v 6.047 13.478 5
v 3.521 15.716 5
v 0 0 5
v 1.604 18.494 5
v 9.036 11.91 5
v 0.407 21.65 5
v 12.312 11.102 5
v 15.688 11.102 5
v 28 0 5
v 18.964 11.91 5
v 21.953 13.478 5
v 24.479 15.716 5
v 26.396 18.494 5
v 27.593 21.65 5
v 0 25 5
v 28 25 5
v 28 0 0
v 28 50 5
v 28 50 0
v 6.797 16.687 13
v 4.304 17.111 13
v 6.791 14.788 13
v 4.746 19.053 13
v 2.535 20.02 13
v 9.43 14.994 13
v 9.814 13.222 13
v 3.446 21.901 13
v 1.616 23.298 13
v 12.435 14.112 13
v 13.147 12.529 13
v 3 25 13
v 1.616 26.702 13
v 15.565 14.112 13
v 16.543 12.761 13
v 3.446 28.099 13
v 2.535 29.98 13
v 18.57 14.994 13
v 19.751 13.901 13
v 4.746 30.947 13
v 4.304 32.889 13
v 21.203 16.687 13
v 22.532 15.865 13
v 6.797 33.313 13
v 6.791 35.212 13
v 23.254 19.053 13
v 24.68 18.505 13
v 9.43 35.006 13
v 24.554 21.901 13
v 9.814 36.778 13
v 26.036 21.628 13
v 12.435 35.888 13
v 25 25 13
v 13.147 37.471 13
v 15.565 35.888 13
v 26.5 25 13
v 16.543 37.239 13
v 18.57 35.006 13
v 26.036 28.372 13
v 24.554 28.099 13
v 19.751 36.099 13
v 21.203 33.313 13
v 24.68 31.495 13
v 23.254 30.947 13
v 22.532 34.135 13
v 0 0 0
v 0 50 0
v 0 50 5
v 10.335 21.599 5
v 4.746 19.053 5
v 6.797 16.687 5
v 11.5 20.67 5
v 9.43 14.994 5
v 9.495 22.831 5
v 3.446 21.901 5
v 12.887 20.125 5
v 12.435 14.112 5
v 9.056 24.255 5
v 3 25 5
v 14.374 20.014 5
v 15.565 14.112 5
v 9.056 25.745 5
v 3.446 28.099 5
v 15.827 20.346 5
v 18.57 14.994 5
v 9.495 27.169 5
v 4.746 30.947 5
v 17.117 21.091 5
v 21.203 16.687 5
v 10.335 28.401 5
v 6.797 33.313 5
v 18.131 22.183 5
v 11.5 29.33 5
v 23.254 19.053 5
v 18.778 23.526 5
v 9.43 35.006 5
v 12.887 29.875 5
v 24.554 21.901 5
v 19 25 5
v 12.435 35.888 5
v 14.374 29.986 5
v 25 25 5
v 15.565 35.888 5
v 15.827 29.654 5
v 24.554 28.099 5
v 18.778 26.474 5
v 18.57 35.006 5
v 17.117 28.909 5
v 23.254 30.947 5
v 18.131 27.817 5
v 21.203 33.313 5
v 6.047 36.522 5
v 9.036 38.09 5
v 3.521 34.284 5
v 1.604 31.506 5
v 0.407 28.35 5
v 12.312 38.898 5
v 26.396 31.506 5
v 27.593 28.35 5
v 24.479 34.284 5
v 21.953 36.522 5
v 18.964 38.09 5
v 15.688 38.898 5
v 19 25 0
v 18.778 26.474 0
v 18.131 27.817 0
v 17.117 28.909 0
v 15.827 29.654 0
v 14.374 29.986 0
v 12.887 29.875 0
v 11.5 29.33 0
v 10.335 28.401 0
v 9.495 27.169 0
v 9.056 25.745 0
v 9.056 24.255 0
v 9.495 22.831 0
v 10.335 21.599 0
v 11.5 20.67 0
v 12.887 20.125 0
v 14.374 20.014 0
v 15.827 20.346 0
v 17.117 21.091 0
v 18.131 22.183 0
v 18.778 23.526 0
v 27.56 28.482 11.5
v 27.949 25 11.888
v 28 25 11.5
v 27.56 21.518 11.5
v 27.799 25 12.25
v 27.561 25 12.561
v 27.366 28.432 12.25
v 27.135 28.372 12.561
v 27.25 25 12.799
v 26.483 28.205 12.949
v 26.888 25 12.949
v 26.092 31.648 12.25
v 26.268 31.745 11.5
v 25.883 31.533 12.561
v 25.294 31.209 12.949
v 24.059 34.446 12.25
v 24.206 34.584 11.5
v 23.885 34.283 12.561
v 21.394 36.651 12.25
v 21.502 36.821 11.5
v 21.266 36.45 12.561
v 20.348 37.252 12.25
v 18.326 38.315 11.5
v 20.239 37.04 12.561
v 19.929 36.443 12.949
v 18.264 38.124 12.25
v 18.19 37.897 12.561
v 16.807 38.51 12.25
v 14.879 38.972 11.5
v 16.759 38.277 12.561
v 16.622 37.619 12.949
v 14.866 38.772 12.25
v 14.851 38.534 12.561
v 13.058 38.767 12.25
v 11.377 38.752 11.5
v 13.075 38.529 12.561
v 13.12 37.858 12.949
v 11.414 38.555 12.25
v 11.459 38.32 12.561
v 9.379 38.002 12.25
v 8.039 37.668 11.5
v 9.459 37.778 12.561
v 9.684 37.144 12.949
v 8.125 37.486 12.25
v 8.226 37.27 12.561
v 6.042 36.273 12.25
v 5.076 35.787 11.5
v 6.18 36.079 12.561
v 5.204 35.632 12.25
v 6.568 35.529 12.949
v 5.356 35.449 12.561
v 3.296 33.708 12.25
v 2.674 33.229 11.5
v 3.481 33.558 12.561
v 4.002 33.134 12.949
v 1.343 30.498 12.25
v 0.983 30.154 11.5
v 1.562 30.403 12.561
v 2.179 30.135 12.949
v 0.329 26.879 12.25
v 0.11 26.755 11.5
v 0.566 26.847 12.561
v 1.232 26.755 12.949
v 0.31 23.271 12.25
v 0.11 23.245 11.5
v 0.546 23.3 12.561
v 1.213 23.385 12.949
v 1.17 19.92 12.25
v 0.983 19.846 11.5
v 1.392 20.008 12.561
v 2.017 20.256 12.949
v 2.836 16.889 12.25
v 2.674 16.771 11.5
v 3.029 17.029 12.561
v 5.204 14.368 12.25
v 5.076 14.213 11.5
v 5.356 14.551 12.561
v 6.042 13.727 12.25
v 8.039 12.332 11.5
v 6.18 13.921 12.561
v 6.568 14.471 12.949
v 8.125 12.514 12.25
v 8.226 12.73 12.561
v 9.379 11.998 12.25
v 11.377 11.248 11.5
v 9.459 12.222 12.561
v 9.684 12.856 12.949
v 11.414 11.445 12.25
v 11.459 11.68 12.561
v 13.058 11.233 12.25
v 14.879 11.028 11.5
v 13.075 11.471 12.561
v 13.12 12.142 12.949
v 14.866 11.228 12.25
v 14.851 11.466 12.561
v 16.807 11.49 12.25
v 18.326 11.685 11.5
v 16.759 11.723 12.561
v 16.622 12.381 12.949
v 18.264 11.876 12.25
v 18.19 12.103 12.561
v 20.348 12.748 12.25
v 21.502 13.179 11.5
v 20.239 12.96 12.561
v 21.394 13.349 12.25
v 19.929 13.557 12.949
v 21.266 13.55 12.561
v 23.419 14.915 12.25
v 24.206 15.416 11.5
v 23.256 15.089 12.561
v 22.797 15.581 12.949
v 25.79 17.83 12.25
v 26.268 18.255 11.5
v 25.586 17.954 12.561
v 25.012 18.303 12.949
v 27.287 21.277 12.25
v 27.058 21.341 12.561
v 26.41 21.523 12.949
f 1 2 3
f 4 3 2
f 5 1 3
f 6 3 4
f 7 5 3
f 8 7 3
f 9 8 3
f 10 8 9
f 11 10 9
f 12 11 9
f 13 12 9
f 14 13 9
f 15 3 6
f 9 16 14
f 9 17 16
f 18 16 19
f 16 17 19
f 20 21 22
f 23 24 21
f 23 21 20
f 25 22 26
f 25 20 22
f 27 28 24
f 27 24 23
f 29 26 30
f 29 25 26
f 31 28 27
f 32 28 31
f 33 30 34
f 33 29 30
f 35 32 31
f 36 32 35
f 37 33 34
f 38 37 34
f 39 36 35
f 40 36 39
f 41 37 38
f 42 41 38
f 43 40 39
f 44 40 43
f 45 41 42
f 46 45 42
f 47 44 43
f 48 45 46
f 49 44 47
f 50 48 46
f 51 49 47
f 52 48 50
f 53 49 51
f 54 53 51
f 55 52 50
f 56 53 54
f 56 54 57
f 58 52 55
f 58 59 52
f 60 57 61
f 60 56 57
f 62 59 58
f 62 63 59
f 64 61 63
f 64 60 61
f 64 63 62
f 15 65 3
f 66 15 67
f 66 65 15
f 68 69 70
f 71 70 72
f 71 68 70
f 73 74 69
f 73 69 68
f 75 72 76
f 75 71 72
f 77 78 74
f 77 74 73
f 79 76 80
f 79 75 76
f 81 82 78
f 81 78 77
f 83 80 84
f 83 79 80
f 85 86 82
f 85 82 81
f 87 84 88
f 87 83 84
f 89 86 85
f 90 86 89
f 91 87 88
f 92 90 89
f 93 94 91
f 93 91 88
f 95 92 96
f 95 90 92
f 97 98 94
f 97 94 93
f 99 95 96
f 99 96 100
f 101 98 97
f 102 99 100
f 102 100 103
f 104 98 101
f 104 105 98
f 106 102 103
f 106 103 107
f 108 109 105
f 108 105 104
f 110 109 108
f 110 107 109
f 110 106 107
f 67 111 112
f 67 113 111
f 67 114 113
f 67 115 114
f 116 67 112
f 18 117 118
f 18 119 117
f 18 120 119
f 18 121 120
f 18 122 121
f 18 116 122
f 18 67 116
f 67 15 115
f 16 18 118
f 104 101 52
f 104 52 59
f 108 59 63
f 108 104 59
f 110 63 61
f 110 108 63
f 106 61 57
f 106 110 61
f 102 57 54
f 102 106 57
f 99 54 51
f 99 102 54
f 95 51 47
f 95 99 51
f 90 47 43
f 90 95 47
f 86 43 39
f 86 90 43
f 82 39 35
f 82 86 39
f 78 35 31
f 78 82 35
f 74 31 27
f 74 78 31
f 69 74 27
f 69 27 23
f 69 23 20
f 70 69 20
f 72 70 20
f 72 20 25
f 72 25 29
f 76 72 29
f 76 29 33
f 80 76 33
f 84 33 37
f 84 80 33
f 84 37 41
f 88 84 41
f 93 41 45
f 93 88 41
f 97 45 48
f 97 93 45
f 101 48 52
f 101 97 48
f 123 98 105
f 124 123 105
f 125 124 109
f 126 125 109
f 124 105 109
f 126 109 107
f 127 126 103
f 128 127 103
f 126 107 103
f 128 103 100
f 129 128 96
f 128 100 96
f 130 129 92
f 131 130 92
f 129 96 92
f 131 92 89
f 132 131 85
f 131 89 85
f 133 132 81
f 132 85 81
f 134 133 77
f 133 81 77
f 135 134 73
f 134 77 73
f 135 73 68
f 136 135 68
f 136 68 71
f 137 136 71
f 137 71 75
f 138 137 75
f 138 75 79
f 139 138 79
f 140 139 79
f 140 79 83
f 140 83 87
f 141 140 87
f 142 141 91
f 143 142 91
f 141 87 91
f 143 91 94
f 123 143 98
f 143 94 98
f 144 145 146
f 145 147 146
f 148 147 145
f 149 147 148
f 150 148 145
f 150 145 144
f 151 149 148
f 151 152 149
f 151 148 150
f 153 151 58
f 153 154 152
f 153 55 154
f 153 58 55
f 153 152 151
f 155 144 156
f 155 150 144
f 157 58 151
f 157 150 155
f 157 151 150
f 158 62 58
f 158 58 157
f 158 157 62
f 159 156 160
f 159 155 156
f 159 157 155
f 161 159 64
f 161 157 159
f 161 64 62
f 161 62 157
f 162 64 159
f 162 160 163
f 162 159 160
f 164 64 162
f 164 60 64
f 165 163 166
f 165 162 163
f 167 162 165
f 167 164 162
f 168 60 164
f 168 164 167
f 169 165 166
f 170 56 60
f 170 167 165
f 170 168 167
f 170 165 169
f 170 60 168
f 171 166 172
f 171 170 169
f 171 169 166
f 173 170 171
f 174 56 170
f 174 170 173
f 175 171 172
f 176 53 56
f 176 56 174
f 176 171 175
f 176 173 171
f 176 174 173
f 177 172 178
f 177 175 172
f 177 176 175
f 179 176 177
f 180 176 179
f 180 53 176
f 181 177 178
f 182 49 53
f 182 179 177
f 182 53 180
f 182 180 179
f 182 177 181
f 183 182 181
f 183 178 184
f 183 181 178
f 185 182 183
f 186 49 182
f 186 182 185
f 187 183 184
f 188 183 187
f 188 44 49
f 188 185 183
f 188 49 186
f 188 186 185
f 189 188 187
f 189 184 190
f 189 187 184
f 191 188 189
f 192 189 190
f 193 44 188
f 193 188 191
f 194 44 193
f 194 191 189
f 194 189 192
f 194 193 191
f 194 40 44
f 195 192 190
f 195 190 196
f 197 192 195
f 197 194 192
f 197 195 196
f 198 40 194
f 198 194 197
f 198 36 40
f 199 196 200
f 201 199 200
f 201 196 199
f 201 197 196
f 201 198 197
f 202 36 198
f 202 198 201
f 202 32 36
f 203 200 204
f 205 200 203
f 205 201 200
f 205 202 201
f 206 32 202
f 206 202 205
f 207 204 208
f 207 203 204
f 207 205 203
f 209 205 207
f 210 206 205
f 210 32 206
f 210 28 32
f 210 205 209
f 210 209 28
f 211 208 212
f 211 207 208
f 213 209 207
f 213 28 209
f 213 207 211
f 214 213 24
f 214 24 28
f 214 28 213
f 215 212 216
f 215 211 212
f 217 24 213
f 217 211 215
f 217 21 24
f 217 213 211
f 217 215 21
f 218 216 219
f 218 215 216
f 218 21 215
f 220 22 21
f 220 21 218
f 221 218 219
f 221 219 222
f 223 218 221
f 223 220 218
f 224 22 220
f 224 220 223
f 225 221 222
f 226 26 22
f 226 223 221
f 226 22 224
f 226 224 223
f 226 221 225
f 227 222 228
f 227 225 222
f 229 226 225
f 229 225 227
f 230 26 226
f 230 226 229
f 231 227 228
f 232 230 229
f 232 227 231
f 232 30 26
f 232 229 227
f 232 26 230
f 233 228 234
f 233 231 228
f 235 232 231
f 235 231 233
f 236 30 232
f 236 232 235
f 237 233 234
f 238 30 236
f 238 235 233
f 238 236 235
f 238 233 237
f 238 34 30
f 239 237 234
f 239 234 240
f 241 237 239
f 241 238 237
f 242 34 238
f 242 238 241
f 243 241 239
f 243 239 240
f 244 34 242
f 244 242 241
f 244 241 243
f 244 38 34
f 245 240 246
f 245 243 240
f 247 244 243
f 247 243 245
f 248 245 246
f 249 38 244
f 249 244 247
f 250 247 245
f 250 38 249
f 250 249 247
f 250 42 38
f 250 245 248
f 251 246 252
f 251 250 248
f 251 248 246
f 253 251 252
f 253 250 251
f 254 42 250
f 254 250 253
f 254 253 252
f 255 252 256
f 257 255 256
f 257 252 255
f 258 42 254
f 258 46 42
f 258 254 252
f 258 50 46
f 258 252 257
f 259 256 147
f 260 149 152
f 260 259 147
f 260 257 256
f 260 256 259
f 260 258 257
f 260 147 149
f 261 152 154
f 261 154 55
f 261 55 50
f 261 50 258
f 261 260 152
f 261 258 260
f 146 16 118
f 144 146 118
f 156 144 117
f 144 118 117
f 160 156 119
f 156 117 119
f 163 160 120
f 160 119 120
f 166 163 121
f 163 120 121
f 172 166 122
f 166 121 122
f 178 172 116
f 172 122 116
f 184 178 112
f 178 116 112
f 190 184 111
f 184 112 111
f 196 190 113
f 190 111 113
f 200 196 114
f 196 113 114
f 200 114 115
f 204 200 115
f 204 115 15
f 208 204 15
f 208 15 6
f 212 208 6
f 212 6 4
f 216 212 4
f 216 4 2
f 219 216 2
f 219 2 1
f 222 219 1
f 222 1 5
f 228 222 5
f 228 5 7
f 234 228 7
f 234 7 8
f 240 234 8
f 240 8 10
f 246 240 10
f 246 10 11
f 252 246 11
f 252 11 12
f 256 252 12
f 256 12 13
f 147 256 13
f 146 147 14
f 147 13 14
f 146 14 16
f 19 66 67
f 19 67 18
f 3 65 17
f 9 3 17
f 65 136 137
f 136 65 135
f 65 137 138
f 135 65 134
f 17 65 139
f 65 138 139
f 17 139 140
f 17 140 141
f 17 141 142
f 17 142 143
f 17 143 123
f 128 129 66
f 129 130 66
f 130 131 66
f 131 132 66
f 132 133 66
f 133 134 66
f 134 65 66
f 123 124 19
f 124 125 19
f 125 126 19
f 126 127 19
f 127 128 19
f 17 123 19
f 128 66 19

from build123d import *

# Parameters (mm, degrees)
F0_W     = 28
F0_H     = 50
F1_DEPTH = 5
F2_R     = 5
F3_DEPTH = 5
F4_R     = 14
F4_R_2   = 11
F5_DEPTH = 8
F6_R     = 1.5


with BuildPart() as f1:
    # F0 (on Top) → F1 (new body)
    with BuildSketch(Plane.XY):
        with Locations((14, 25)):
            Rectangle(F0_W, F0_H)
    extrude(amount=F1_DEPTH)

    # F2 (on face) → F3 (cut, through all)
    with BuildSketch(Plane.XY.offset(5)):
        with Locations((14, 25)):
            Circle(F2_R)
    extrude(amount=-F3_DEPTH, mode=Mode.SUBTRACT)

    # F4 (on face) → F5 (join)
    with BuildSketch(Plane.XY.offset(5)):
        with Locations((14, 25)):
            Circle(F4_R)
        with Locations((14, 25)):
            Circle(F4_R_2, mode=Mode.SUBTRACT)
    extrude(amount=F5_DEPTH)

    # F6
    f6_edges = [f1.edges().sort_by_distance(p)[0] for p in [
        (0, 25, 13),
    ]]
    fillet(f6_edges, radius=F6_R)


solid = f1.part
